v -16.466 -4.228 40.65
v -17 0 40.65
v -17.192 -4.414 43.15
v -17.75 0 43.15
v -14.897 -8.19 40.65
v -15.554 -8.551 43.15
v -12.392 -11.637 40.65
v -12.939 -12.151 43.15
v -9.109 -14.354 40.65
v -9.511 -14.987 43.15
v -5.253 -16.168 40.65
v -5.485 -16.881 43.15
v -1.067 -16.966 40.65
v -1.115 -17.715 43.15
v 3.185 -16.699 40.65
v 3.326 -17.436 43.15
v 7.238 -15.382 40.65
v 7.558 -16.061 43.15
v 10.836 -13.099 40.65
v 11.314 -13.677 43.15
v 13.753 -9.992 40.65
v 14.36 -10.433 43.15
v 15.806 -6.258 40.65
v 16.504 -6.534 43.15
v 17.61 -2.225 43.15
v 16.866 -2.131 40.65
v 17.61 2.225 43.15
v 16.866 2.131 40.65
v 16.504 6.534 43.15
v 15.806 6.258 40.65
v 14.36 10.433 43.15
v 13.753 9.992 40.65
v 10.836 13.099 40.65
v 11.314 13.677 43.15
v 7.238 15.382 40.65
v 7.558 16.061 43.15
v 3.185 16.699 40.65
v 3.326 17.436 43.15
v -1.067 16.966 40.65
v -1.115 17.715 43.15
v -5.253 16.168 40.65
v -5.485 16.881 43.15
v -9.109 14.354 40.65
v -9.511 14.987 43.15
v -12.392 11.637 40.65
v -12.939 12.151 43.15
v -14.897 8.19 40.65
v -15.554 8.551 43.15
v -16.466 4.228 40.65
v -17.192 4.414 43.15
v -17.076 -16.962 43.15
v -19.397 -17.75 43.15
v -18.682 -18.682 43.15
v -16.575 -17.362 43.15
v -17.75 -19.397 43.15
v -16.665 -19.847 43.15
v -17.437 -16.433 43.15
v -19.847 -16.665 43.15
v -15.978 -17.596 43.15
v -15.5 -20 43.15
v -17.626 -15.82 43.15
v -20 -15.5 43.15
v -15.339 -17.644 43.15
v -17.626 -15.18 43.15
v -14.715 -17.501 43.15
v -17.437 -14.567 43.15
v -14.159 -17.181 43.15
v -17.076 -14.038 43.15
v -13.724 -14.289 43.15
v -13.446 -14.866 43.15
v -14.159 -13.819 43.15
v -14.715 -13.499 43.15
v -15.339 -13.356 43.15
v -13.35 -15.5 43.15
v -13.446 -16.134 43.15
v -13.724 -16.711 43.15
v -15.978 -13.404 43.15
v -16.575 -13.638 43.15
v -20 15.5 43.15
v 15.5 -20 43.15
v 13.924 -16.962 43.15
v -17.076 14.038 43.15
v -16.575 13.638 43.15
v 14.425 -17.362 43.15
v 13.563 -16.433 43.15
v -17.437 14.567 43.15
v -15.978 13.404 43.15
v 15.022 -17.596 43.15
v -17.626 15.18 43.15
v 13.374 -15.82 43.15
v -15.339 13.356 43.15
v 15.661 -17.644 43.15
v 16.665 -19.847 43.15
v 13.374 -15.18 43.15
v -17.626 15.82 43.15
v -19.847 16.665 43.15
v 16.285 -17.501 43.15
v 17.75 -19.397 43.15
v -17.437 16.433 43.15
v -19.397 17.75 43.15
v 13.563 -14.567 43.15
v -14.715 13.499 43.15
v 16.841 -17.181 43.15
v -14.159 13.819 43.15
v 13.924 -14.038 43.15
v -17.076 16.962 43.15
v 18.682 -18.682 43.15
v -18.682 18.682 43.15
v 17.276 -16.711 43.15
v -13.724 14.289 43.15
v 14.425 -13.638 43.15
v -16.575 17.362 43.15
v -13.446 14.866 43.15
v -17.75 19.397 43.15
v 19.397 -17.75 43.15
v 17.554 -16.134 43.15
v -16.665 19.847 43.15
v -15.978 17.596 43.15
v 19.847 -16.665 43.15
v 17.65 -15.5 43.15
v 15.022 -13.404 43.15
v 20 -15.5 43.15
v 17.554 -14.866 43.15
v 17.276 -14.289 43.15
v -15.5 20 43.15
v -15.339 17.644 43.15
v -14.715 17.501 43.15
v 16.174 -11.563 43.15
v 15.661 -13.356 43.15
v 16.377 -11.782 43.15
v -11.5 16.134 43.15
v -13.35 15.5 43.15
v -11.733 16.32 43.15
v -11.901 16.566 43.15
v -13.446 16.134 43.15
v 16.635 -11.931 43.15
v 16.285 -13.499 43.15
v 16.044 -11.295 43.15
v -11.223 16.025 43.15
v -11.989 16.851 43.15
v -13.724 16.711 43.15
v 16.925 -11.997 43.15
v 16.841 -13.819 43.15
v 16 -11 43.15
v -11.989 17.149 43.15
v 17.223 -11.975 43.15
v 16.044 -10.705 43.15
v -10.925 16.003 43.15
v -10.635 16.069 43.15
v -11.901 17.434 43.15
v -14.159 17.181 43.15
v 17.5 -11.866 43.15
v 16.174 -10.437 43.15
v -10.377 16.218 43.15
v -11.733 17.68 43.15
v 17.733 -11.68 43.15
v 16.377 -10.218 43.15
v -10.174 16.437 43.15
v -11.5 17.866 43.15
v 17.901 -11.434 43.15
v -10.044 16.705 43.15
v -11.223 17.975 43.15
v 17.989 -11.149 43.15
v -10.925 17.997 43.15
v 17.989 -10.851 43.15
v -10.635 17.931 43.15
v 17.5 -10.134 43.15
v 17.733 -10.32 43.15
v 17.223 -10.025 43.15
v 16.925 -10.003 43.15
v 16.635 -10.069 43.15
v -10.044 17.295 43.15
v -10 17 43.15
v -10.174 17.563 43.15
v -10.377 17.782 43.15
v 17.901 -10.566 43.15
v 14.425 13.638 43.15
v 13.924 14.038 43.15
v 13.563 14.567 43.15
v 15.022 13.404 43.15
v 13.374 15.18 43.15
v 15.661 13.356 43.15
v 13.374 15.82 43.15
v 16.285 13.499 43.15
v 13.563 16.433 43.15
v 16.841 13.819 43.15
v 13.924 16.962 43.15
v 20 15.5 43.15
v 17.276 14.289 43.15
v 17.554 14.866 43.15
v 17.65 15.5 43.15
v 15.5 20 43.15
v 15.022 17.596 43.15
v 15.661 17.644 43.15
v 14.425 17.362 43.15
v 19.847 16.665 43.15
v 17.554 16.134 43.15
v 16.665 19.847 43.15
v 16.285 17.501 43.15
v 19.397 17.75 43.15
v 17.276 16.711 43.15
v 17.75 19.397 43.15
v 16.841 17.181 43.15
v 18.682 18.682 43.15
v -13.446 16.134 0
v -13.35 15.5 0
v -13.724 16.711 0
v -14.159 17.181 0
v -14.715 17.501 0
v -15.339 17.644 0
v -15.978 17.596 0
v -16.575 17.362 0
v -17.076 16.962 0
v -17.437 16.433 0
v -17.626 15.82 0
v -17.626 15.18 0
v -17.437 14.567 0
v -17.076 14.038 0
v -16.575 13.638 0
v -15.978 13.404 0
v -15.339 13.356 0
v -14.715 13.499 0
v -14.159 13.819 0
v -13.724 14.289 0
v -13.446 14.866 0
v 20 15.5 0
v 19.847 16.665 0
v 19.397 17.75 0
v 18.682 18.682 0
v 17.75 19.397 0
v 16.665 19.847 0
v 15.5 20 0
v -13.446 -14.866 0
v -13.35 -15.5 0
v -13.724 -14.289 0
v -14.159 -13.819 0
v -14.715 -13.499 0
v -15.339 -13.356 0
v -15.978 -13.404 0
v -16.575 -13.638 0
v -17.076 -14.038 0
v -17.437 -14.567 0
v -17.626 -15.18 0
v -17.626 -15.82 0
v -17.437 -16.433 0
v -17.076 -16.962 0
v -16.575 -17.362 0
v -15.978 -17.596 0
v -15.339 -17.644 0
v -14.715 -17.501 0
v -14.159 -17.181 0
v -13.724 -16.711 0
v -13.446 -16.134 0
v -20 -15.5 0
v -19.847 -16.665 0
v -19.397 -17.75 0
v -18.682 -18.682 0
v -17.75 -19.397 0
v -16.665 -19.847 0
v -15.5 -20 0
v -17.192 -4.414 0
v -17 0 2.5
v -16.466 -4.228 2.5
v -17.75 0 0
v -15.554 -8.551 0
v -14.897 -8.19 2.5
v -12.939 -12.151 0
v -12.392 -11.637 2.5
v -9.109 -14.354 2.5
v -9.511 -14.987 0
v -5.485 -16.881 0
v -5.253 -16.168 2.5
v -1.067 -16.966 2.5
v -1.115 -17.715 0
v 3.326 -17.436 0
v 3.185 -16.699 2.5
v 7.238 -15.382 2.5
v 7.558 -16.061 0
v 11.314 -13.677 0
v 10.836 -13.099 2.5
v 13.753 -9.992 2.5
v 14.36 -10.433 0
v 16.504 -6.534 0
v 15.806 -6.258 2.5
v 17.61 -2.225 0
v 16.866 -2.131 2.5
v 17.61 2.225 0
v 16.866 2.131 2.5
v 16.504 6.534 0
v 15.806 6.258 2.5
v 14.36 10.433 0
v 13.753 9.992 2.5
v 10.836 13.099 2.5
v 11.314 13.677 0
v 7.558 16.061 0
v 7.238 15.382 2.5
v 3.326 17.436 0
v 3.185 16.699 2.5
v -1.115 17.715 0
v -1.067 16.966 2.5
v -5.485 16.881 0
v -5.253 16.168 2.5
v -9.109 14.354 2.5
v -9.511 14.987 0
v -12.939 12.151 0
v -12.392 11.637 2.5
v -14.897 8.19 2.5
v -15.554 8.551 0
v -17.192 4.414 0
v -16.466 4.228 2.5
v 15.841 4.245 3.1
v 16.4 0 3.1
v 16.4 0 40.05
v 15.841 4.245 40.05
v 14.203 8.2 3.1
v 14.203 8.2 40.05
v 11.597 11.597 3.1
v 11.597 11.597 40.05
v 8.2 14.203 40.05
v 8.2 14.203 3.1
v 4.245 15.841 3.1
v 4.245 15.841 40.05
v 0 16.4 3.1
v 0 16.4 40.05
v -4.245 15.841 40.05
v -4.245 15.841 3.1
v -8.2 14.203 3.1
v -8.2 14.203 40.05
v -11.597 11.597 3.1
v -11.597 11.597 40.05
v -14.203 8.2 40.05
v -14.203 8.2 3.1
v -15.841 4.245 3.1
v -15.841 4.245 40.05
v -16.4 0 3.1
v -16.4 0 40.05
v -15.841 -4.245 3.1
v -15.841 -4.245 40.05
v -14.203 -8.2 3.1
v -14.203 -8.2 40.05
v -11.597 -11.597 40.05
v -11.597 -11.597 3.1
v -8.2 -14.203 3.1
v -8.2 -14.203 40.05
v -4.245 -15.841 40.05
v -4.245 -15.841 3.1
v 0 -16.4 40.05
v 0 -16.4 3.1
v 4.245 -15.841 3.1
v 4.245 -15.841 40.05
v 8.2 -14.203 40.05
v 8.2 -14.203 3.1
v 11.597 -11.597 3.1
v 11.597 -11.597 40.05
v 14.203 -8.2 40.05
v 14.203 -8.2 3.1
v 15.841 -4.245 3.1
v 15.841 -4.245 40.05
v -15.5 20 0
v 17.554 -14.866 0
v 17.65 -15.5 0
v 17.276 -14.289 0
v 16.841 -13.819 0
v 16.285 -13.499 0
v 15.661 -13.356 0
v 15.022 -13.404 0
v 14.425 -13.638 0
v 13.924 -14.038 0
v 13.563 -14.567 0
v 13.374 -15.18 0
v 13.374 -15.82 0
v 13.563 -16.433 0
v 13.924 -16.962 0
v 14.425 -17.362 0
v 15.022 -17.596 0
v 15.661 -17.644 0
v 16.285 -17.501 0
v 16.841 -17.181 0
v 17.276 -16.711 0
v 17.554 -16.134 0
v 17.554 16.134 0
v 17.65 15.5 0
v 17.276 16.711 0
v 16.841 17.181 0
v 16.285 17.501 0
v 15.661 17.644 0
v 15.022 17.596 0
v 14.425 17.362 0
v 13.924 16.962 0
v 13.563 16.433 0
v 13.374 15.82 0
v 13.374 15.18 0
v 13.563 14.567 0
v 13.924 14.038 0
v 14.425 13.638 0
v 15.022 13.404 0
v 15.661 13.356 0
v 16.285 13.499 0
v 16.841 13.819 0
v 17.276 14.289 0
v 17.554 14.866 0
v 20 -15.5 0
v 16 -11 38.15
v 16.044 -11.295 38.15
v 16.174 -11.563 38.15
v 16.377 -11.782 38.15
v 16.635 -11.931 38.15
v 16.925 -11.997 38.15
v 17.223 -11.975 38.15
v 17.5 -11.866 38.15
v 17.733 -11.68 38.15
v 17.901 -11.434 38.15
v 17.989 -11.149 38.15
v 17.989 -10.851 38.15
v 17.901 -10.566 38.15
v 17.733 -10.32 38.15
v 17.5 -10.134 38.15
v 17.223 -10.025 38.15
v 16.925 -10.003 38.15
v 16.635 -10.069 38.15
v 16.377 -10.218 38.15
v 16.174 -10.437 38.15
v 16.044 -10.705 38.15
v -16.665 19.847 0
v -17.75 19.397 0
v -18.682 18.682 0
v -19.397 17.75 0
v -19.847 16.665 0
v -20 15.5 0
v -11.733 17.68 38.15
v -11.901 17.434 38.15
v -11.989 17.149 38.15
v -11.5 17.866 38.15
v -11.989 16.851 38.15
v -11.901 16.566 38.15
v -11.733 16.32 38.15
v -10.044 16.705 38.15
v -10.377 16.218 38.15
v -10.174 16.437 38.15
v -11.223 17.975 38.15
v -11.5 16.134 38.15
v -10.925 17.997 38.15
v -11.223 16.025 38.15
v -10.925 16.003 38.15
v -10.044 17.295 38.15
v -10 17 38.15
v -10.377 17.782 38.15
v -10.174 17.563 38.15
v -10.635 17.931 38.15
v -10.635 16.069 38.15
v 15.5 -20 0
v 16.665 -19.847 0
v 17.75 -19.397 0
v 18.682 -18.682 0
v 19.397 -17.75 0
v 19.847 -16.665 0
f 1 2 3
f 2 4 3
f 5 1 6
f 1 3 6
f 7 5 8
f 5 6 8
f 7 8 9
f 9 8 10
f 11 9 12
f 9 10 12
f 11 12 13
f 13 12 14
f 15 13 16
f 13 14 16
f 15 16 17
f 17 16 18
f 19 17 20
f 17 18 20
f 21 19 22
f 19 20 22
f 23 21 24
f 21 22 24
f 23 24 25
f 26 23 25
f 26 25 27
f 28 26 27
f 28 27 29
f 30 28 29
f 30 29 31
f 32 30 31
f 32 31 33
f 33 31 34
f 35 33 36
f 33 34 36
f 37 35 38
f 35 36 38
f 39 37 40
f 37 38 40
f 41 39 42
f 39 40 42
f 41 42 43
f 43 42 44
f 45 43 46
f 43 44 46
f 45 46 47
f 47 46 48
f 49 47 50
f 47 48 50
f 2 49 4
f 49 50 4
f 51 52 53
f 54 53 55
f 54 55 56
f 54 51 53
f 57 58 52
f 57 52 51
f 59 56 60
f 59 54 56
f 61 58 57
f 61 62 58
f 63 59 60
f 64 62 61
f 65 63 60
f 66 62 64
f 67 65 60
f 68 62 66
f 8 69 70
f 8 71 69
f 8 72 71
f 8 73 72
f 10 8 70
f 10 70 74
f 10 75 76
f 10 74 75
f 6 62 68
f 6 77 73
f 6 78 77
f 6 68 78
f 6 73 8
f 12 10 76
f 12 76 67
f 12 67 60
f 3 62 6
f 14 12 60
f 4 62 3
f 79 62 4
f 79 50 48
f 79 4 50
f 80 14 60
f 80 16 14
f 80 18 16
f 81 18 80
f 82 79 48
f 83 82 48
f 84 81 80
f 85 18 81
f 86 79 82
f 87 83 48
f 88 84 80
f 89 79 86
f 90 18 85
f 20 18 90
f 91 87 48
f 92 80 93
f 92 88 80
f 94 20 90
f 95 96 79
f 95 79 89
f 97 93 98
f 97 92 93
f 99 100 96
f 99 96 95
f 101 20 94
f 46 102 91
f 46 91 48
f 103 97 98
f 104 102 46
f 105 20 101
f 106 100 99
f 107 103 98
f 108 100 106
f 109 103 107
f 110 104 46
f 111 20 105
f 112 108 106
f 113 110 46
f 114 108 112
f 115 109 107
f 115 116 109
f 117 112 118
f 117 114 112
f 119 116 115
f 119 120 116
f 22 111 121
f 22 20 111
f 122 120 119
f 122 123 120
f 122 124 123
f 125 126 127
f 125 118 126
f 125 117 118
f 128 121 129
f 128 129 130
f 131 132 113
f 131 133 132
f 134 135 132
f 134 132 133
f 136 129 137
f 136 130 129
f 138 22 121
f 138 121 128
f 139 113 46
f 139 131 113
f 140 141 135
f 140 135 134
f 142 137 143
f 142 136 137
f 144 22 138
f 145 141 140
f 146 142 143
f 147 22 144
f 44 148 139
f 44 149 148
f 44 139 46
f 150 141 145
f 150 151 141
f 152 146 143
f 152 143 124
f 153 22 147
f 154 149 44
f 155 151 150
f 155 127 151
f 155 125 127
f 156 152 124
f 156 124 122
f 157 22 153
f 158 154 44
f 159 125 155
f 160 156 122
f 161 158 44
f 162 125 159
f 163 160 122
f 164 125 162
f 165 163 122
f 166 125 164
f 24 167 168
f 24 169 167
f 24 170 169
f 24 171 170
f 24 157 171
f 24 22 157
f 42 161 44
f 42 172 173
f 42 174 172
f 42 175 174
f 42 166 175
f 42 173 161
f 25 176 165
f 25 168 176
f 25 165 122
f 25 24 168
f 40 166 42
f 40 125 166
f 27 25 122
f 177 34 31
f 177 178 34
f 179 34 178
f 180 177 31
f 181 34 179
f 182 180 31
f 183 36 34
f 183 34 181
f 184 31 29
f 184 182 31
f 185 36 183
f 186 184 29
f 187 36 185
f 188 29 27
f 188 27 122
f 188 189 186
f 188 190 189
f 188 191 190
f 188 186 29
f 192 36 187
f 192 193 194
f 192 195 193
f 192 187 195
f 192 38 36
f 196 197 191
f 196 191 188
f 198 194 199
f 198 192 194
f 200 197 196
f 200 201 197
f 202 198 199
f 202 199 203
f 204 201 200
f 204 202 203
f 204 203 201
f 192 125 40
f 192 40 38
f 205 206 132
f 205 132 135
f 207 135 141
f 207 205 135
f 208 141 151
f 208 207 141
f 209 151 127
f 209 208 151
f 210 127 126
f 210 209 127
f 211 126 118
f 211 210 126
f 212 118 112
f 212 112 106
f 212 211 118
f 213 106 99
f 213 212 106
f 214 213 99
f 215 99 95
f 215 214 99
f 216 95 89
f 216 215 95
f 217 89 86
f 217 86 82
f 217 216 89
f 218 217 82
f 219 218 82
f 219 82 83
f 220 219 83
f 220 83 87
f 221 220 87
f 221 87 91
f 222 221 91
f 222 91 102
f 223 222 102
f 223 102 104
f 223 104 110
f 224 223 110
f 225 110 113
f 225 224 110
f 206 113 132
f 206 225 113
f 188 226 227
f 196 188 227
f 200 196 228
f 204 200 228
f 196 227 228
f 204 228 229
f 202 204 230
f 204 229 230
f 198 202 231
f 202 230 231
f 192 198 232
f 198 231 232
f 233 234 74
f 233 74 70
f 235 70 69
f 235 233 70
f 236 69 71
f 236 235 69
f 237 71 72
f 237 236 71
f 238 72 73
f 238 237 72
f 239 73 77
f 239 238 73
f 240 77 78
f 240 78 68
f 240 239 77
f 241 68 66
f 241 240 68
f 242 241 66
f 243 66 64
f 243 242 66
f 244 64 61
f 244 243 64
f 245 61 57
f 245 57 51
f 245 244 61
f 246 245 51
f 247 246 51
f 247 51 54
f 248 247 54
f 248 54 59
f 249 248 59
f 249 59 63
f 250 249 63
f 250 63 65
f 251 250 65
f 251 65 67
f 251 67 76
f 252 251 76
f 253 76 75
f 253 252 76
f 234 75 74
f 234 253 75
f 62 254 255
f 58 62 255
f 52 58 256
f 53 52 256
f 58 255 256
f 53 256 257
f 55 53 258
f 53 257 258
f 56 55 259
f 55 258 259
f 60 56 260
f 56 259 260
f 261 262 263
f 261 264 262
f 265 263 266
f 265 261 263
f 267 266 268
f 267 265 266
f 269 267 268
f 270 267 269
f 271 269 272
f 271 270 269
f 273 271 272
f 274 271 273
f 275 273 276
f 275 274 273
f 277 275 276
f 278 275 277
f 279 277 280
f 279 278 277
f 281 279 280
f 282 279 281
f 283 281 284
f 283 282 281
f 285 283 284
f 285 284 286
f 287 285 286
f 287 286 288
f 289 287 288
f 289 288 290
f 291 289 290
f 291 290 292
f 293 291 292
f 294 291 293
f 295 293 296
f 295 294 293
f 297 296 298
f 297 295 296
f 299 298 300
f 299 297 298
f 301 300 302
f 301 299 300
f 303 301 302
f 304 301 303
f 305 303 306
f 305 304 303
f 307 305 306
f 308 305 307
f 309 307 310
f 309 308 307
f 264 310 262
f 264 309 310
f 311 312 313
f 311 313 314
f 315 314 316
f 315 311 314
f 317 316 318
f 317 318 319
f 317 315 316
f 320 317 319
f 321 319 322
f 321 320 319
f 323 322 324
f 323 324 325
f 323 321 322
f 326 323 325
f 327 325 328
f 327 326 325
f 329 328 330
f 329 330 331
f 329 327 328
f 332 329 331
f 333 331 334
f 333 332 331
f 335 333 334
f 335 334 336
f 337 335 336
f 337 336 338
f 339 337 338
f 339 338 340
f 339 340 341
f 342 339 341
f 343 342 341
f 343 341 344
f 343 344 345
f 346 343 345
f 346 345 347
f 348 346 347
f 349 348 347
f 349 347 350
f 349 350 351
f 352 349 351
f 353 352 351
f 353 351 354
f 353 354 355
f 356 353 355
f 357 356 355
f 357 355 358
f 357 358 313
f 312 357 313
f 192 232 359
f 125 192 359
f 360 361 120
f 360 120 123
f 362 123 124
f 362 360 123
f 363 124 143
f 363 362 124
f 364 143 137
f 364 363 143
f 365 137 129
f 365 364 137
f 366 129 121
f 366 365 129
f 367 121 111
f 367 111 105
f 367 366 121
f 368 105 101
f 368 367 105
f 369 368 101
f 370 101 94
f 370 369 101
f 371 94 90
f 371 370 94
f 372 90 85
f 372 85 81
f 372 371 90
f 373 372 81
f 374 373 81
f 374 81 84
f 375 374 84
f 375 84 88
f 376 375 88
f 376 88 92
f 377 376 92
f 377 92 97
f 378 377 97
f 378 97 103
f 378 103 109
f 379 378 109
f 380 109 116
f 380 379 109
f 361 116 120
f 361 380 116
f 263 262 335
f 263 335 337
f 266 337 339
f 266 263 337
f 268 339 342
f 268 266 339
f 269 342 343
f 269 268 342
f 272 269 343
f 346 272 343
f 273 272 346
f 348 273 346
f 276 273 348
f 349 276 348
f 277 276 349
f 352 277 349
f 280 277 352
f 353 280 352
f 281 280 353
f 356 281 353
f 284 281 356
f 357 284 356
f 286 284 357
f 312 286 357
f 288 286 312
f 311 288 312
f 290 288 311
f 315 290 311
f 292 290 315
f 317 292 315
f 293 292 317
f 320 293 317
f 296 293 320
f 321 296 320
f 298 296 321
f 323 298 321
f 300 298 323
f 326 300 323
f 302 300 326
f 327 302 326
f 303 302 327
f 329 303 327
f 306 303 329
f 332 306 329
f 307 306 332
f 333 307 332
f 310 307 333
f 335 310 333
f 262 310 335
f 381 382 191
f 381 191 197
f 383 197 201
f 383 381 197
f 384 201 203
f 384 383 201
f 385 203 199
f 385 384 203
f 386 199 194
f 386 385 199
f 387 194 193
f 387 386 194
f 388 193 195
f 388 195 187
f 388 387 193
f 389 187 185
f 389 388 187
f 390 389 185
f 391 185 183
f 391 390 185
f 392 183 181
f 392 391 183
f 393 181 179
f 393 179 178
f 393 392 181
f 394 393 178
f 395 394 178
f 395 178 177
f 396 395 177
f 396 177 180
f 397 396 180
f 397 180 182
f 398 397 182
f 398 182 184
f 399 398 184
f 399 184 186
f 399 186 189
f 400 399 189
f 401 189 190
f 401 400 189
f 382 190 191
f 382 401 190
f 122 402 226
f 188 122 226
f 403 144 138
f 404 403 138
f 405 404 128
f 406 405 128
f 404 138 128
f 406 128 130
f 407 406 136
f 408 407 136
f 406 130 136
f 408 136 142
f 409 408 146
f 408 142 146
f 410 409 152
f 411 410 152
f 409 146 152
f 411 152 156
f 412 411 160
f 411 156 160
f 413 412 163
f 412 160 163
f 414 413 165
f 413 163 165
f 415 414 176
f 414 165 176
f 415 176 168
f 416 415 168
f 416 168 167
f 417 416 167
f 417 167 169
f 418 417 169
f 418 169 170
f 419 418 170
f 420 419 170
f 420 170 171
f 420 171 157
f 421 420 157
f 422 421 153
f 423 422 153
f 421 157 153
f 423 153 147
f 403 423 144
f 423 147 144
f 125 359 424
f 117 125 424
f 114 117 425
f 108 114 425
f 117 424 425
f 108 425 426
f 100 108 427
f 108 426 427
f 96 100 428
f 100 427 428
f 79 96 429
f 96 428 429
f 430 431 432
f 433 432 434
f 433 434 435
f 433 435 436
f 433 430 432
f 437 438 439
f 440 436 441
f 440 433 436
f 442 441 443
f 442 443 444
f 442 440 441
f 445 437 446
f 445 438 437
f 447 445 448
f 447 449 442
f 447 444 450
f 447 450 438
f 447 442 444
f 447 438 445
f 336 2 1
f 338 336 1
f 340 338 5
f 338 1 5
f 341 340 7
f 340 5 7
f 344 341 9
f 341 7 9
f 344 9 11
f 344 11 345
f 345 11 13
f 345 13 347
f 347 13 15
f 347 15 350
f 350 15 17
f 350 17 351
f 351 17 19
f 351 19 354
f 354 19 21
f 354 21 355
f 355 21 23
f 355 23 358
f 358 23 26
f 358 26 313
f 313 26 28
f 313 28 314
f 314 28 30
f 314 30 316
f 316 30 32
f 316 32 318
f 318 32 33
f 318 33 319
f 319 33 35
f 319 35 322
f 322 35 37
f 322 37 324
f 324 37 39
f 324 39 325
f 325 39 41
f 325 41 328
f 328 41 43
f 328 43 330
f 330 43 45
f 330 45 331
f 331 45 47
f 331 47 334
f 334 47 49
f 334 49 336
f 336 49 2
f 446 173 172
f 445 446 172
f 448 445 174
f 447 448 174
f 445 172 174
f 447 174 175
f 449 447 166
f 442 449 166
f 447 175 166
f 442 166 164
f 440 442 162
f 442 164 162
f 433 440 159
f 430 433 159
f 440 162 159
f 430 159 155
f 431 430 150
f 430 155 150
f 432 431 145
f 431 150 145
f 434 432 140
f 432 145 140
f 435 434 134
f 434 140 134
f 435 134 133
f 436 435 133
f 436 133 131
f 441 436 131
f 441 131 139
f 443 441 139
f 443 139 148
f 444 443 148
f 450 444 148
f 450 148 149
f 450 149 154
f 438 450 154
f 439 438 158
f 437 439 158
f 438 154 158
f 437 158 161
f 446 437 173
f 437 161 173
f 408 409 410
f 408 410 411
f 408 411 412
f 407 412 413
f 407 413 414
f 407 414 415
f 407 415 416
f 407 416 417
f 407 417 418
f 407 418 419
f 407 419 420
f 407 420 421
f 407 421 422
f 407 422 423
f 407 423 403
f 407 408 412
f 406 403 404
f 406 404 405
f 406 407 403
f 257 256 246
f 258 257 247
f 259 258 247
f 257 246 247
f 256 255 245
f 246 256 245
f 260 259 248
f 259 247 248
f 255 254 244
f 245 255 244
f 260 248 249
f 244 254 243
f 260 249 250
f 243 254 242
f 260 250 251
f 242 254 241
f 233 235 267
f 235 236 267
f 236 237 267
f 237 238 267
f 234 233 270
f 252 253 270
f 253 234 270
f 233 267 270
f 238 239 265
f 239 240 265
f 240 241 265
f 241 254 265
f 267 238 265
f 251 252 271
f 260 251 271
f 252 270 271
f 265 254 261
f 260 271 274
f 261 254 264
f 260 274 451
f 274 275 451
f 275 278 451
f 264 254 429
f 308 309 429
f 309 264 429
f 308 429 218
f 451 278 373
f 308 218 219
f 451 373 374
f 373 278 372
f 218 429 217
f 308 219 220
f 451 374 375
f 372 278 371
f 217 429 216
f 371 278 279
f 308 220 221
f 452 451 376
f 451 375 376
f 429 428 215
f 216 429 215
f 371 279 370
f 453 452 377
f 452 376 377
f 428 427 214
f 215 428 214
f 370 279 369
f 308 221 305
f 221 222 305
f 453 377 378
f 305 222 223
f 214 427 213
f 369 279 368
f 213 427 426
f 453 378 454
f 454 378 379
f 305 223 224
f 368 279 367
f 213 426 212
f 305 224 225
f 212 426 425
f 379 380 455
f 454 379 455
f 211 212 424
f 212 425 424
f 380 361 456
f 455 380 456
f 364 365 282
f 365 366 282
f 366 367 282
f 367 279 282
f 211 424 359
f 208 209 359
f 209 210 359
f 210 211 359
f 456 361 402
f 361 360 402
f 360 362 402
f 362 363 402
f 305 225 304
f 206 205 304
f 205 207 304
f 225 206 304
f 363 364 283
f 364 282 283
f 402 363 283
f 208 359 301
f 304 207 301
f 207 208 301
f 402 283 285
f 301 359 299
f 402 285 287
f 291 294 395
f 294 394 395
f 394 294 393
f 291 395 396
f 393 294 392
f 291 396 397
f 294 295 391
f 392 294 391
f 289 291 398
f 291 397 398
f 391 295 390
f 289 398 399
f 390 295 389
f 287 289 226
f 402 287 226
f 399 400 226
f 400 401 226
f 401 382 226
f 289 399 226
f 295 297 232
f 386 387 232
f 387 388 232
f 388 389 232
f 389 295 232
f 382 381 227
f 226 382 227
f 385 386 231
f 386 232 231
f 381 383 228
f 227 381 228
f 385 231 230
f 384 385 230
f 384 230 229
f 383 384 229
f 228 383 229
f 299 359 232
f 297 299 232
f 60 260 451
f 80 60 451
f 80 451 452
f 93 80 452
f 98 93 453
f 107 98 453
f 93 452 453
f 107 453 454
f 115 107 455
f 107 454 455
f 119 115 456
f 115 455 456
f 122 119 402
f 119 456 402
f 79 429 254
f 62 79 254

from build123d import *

# Parameters (mm, degrees)
SKETCH1_R           = 16.4
SKETCH1_R_2         = 2.15
BOSS_EXTRUDE1_DEPTH = 43.15
SKETCH6_R           = 1
CUT_EXTRUDE1_DEPTH  = 5


with BuildPart() as part:
    # Sketch1 → Boss-Extrude1 (new body)
    with BuildSketch(Plane.XY):
        with BuildLine():
            Line((-15.5, -20), (15.5, -20))
            ThreePointArc((15.5, -20), (18.681980515, -18.681980515), (20, -15.5))
            Line((20, -15.5), (20, 15.5))
            ThreePointArc((20, 15.5), (18.681980515, 18.681980515), (15.5, 20))
            Line((15.5, 20), (-15.5, 20))
            ThreePointArc((-15.5, 20), (-18.681980515, 18.681980515), (-20, 15.5))
            Line((-20, 15.5), (-20, -15.5))
            ThreePointArc((-20, -15.5), (-18.681980515, -18.681980515), (-15.5, -20))
        make_face()
        Circle(SKETCH1_R, mode=Mode.SUBTRACT)
        with Locations((-15.5, 15.5)):
            Circle(SKETCH1_R_2, mode=Mode.SUBTRACT)
        with Locations((15.5, 15.5)):
            Circle(SKETCH1_R_2, mode=Mode.SUBTRACT)
        with Locations((15.5, -15.5)):
            Circle(SKETCH1_R_2, mode=Mode.SUBTRACT)
        with Locations((-15.5, -15.5)):
            Circle(SKETCH1_R_2, mode=Mode.SUBTRACT)
    extrude(amount=BOSS_EXTRUDE1_DEPTH)

    # Sketch5 → Cut-Revolve1 (revolve, cut)
    with BuildSketch(Plane(origin=(0, 0, 0), x_dir=(1, 0, 0), z_dir=(0, 1, 0)), mode=Mode.PRIVATE) as cut_revolve1_sk:
        Polygon((16.4, -3.1), (17, -2.5), (17.75, 0), (16.4, 0), align=None)
    cut_revolve1 = revolve(cut_revolve1_sk.sketch.rotate(Axis((0, 0, -2.15), (0, 0, 1)), 180), axis=Axis((0, 0, -2.15), (0, 0, 1)), mode=Mode.SUBTRACT)

    # Mirror1: Cut-Revolve1 across plane
    add(cut_revolve1.mirror(Plane(origin=(0, 0, 21.575), x_dir=(1, 0, 0), z_dir=(0, 0, -1))), mode=Mode.SUBTRACT)

    # Sketch6 → Cut-Extrude1 (cut)
    with BuildSketch(Plane.XY.offset(43.15)):
        with Locations((-11, 17)):
            Circle(SKETCH6_R)
        with Locations(Location((17, -11, 0), (0, 0, 180))):
            Circle(SKETCH6_R)
    extrude(amount=-CUT_EXTRUDE1_DEPTH, mode=Mode.SUBTRACT)


solid = part.part
